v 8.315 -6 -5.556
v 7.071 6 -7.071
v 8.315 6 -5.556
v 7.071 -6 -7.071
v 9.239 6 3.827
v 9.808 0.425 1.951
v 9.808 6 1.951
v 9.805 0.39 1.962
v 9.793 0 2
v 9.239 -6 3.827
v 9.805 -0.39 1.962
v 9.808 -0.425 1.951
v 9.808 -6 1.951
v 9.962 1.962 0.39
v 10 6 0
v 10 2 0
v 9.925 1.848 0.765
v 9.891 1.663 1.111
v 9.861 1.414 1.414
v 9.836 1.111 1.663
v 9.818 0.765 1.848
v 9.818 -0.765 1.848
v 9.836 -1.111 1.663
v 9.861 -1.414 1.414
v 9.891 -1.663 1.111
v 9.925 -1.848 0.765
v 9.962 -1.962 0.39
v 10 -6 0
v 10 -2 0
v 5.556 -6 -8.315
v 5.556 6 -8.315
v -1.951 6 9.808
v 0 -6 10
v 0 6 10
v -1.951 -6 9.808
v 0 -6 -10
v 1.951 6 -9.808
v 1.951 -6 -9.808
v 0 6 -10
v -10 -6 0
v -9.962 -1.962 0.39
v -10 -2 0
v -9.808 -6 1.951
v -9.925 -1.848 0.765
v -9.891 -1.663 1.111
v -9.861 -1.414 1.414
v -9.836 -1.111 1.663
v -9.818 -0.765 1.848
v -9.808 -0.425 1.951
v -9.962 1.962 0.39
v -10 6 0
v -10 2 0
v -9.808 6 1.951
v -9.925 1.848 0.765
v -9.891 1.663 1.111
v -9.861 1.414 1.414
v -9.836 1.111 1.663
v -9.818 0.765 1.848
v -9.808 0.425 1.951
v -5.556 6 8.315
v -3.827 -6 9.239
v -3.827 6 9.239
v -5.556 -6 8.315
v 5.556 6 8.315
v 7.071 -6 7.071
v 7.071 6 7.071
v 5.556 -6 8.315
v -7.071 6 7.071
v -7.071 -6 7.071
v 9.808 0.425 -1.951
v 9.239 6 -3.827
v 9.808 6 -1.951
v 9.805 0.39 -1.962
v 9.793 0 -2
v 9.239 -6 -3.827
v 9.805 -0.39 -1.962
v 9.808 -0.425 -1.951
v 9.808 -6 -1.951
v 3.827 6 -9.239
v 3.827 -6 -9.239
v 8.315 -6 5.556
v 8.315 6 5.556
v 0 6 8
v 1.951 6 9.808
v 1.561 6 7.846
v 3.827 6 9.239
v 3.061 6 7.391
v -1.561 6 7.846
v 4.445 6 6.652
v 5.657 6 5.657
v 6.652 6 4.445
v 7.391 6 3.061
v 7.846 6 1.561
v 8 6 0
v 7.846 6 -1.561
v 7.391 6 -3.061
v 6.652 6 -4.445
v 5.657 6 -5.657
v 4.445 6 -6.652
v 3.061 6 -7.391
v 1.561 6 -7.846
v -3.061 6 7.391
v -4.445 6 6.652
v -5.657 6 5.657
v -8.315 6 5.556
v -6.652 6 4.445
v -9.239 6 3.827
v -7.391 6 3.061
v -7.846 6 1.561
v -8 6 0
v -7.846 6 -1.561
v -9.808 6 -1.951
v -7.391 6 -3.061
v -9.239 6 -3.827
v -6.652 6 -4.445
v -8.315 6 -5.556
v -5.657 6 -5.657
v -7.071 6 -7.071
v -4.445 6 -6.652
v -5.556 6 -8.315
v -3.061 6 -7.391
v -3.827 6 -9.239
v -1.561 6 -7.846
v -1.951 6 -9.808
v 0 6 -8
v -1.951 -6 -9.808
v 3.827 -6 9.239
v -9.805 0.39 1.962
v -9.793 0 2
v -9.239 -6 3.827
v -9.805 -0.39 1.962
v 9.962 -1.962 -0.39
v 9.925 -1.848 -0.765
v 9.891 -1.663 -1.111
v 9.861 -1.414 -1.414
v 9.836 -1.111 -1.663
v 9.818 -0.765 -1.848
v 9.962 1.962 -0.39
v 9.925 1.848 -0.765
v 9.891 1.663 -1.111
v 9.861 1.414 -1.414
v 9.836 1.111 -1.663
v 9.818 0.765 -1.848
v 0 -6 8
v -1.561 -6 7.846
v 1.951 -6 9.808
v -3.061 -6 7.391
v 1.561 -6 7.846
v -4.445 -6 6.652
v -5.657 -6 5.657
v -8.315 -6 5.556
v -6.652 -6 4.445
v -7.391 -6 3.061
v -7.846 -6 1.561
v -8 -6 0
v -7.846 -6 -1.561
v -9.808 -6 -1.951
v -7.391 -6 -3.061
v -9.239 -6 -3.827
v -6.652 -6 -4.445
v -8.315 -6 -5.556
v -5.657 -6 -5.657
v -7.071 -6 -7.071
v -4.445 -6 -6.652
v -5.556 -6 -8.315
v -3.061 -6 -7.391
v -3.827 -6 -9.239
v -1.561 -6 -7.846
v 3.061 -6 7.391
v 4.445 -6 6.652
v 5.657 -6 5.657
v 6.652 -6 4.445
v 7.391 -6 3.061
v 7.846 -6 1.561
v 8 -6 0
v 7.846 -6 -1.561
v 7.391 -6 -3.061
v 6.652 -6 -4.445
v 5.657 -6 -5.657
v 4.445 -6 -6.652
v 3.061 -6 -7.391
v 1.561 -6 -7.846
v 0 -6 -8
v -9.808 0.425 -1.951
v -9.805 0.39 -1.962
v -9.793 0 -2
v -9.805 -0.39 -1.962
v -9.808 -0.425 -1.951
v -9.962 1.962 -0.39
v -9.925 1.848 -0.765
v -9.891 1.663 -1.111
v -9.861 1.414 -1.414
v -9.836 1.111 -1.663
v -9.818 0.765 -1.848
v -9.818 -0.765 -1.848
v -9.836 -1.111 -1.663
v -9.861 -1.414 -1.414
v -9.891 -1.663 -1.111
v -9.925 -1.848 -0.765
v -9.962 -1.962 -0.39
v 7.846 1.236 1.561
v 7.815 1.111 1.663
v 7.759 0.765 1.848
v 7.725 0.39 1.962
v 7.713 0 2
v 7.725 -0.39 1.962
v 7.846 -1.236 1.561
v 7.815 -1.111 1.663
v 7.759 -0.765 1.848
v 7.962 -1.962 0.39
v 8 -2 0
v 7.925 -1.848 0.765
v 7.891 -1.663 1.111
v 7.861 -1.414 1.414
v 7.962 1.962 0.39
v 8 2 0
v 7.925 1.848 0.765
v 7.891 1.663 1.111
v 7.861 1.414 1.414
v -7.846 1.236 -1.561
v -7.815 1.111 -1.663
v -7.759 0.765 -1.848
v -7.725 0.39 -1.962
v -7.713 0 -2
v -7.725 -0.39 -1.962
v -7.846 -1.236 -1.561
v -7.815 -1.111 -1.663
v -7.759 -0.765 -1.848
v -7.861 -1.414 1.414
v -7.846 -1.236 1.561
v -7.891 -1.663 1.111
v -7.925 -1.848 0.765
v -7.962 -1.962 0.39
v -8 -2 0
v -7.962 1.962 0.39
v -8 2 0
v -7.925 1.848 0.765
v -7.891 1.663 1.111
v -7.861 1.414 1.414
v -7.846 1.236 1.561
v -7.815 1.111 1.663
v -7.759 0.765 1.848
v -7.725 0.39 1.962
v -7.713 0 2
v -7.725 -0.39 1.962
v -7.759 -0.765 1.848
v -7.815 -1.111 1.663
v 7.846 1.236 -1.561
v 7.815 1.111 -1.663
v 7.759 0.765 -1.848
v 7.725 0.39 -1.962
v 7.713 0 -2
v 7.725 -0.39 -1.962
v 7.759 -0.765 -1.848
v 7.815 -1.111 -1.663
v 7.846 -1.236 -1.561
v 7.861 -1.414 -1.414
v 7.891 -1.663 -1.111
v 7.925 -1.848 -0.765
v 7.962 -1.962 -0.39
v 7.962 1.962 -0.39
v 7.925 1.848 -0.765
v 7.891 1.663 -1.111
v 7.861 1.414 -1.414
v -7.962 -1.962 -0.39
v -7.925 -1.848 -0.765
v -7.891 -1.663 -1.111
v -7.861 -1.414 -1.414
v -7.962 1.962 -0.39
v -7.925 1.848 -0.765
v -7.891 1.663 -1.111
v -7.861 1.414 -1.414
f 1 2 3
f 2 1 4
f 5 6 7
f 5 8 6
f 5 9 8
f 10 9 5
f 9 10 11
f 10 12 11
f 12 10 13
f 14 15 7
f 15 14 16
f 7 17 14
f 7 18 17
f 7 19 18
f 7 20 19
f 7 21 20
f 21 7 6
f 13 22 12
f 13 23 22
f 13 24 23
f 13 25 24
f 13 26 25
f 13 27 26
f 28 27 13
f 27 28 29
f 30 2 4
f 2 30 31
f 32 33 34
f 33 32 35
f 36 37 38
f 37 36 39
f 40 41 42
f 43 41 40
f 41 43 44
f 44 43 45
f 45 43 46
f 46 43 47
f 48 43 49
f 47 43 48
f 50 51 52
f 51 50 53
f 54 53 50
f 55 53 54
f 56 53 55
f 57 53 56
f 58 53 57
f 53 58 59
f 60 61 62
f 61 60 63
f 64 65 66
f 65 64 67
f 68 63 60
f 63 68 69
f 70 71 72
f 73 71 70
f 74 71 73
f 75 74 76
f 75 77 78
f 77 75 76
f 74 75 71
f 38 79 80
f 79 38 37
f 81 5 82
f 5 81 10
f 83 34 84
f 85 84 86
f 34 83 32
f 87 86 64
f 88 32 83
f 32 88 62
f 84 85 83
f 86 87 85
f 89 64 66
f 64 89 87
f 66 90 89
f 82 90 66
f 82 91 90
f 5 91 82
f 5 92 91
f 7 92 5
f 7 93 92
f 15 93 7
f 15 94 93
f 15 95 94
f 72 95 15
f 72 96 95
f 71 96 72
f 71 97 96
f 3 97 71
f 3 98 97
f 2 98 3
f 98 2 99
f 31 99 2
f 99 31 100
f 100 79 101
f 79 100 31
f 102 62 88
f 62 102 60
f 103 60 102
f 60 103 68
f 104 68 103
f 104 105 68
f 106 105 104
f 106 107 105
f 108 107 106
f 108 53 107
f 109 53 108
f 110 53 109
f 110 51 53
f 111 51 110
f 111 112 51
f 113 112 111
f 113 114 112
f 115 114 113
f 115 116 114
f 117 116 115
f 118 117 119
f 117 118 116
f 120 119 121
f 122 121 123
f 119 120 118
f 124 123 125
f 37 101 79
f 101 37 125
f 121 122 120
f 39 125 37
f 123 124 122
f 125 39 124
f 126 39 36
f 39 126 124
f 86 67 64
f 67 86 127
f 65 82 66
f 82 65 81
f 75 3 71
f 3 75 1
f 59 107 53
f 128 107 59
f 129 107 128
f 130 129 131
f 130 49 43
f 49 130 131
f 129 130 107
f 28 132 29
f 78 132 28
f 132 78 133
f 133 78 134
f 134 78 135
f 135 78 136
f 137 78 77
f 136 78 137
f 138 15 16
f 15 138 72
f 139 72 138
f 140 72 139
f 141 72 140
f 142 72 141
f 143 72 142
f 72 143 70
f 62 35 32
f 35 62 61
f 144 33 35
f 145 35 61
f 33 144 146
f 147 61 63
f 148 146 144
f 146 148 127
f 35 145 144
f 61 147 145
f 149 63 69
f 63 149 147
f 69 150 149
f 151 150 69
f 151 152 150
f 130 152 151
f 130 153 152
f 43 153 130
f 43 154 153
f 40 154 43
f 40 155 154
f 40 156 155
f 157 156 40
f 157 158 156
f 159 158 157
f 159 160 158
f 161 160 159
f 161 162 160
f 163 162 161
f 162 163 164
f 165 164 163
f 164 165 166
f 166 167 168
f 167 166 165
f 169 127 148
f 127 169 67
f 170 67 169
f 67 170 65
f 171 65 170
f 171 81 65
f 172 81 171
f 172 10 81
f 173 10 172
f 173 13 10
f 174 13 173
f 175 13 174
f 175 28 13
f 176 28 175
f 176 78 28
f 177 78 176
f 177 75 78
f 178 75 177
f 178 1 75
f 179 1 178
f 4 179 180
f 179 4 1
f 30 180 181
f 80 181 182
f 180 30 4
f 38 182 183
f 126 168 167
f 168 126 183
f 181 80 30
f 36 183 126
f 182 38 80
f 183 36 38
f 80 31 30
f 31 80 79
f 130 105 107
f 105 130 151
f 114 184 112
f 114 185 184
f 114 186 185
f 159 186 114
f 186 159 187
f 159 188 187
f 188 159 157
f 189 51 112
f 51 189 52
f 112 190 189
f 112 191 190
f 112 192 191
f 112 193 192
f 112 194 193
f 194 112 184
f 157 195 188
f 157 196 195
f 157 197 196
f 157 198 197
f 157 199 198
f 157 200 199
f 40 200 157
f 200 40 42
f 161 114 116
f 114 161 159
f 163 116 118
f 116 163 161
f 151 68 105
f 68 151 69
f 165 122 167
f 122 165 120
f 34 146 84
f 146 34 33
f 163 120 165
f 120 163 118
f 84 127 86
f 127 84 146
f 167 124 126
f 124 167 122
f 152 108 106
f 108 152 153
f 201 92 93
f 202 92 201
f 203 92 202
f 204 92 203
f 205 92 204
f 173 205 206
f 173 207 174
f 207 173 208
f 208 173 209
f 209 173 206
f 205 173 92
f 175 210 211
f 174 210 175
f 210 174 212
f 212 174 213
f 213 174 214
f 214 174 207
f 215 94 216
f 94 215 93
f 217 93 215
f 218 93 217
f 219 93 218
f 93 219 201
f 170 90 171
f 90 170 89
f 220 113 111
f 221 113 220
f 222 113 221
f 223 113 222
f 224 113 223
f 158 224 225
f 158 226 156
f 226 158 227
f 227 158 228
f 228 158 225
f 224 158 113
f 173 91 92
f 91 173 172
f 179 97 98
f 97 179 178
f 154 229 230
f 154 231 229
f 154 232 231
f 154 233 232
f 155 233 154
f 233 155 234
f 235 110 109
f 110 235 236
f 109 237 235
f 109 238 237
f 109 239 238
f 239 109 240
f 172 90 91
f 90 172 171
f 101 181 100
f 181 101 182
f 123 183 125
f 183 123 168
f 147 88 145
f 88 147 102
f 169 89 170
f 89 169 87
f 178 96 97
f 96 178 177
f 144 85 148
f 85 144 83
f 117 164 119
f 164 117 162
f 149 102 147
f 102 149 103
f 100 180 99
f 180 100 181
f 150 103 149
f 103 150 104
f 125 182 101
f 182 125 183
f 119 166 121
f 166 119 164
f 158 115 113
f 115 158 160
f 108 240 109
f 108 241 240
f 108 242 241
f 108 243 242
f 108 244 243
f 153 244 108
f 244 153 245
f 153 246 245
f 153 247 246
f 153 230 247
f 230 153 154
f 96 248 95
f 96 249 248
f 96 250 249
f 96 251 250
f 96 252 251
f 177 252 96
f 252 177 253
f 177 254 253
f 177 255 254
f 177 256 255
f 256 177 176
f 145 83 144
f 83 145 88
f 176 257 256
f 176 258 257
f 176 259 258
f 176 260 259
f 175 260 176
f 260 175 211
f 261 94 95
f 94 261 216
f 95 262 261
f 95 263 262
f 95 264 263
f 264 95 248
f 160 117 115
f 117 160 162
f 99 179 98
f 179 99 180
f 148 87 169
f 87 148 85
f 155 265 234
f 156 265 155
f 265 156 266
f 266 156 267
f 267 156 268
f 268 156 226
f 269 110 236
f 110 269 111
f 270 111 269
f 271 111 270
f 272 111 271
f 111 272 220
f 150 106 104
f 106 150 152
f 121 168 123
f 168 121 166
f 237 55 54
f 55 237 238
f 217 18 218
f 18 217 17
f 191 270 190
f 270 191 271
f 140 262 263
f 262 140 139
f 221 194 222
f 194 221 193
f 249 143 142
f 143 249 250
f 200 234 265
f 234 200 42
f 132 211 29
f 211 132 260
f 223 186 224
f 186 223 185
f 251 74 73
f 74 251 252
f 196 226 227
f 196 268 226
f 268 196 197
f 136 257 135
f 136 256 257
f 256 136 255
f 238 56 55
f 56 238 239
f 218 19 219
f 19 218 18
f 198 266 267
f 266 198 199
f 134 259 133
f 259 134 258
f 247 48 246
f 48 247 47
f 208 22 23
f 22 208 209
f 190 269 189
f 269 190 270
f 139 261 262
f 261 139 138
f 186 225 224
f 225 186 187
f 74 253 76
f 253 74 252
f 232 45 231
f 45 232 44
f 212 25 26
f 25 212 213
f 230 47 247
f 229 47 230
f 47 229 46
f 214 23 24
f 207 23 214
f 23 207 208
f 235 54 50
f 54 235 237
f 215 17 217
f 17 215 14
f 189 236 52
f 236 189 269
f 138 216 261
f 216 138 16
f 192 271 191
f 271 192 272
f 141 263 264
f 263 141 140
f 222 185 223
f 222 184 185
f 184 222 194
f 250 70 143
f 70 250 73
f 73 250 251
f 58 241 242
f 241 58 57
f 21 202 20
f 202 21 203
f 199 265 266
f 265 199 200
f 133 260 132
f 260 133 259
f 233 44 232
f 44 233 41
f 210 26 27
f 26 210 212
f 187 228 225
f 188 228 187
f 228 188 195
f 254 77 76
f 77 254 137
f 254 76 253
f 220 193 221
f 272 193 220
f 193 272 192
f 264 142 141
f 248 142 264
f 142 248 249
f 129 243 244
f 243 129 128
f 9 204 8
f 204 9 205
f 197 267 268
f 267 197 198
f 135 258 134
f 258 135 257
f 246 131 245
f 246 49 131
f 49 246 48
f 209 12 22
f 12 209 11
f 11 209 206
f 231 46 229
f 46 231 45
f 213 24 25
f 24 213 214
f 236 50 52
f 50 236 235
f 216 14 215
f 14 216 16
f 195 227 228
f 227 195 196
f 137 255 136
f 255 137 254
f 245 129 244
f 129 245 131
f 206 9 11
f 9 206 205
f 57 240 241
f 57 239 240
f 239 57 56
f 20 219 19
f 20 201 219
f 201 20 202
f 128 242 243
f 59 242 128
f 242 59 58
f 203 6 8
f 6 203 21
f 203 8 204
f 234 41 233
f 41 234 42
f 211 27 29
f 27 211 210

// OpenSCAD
// COBRA Spine Joint Gimbal

$fn = 32;

difference() {
    rotate([90, 0, 0])
    cylinder(h=12, d=20, center=true);
    
    rotate([90, 0, 0])
    cylinder(h=14, d=16, center=true);
    
    rotate([0, 90, 0])
    cylinder(h=22, d=4, center=true);
    
    rotate([90, 0, 0])
    cylinder(h=16, d=2.5, center=true);
}
